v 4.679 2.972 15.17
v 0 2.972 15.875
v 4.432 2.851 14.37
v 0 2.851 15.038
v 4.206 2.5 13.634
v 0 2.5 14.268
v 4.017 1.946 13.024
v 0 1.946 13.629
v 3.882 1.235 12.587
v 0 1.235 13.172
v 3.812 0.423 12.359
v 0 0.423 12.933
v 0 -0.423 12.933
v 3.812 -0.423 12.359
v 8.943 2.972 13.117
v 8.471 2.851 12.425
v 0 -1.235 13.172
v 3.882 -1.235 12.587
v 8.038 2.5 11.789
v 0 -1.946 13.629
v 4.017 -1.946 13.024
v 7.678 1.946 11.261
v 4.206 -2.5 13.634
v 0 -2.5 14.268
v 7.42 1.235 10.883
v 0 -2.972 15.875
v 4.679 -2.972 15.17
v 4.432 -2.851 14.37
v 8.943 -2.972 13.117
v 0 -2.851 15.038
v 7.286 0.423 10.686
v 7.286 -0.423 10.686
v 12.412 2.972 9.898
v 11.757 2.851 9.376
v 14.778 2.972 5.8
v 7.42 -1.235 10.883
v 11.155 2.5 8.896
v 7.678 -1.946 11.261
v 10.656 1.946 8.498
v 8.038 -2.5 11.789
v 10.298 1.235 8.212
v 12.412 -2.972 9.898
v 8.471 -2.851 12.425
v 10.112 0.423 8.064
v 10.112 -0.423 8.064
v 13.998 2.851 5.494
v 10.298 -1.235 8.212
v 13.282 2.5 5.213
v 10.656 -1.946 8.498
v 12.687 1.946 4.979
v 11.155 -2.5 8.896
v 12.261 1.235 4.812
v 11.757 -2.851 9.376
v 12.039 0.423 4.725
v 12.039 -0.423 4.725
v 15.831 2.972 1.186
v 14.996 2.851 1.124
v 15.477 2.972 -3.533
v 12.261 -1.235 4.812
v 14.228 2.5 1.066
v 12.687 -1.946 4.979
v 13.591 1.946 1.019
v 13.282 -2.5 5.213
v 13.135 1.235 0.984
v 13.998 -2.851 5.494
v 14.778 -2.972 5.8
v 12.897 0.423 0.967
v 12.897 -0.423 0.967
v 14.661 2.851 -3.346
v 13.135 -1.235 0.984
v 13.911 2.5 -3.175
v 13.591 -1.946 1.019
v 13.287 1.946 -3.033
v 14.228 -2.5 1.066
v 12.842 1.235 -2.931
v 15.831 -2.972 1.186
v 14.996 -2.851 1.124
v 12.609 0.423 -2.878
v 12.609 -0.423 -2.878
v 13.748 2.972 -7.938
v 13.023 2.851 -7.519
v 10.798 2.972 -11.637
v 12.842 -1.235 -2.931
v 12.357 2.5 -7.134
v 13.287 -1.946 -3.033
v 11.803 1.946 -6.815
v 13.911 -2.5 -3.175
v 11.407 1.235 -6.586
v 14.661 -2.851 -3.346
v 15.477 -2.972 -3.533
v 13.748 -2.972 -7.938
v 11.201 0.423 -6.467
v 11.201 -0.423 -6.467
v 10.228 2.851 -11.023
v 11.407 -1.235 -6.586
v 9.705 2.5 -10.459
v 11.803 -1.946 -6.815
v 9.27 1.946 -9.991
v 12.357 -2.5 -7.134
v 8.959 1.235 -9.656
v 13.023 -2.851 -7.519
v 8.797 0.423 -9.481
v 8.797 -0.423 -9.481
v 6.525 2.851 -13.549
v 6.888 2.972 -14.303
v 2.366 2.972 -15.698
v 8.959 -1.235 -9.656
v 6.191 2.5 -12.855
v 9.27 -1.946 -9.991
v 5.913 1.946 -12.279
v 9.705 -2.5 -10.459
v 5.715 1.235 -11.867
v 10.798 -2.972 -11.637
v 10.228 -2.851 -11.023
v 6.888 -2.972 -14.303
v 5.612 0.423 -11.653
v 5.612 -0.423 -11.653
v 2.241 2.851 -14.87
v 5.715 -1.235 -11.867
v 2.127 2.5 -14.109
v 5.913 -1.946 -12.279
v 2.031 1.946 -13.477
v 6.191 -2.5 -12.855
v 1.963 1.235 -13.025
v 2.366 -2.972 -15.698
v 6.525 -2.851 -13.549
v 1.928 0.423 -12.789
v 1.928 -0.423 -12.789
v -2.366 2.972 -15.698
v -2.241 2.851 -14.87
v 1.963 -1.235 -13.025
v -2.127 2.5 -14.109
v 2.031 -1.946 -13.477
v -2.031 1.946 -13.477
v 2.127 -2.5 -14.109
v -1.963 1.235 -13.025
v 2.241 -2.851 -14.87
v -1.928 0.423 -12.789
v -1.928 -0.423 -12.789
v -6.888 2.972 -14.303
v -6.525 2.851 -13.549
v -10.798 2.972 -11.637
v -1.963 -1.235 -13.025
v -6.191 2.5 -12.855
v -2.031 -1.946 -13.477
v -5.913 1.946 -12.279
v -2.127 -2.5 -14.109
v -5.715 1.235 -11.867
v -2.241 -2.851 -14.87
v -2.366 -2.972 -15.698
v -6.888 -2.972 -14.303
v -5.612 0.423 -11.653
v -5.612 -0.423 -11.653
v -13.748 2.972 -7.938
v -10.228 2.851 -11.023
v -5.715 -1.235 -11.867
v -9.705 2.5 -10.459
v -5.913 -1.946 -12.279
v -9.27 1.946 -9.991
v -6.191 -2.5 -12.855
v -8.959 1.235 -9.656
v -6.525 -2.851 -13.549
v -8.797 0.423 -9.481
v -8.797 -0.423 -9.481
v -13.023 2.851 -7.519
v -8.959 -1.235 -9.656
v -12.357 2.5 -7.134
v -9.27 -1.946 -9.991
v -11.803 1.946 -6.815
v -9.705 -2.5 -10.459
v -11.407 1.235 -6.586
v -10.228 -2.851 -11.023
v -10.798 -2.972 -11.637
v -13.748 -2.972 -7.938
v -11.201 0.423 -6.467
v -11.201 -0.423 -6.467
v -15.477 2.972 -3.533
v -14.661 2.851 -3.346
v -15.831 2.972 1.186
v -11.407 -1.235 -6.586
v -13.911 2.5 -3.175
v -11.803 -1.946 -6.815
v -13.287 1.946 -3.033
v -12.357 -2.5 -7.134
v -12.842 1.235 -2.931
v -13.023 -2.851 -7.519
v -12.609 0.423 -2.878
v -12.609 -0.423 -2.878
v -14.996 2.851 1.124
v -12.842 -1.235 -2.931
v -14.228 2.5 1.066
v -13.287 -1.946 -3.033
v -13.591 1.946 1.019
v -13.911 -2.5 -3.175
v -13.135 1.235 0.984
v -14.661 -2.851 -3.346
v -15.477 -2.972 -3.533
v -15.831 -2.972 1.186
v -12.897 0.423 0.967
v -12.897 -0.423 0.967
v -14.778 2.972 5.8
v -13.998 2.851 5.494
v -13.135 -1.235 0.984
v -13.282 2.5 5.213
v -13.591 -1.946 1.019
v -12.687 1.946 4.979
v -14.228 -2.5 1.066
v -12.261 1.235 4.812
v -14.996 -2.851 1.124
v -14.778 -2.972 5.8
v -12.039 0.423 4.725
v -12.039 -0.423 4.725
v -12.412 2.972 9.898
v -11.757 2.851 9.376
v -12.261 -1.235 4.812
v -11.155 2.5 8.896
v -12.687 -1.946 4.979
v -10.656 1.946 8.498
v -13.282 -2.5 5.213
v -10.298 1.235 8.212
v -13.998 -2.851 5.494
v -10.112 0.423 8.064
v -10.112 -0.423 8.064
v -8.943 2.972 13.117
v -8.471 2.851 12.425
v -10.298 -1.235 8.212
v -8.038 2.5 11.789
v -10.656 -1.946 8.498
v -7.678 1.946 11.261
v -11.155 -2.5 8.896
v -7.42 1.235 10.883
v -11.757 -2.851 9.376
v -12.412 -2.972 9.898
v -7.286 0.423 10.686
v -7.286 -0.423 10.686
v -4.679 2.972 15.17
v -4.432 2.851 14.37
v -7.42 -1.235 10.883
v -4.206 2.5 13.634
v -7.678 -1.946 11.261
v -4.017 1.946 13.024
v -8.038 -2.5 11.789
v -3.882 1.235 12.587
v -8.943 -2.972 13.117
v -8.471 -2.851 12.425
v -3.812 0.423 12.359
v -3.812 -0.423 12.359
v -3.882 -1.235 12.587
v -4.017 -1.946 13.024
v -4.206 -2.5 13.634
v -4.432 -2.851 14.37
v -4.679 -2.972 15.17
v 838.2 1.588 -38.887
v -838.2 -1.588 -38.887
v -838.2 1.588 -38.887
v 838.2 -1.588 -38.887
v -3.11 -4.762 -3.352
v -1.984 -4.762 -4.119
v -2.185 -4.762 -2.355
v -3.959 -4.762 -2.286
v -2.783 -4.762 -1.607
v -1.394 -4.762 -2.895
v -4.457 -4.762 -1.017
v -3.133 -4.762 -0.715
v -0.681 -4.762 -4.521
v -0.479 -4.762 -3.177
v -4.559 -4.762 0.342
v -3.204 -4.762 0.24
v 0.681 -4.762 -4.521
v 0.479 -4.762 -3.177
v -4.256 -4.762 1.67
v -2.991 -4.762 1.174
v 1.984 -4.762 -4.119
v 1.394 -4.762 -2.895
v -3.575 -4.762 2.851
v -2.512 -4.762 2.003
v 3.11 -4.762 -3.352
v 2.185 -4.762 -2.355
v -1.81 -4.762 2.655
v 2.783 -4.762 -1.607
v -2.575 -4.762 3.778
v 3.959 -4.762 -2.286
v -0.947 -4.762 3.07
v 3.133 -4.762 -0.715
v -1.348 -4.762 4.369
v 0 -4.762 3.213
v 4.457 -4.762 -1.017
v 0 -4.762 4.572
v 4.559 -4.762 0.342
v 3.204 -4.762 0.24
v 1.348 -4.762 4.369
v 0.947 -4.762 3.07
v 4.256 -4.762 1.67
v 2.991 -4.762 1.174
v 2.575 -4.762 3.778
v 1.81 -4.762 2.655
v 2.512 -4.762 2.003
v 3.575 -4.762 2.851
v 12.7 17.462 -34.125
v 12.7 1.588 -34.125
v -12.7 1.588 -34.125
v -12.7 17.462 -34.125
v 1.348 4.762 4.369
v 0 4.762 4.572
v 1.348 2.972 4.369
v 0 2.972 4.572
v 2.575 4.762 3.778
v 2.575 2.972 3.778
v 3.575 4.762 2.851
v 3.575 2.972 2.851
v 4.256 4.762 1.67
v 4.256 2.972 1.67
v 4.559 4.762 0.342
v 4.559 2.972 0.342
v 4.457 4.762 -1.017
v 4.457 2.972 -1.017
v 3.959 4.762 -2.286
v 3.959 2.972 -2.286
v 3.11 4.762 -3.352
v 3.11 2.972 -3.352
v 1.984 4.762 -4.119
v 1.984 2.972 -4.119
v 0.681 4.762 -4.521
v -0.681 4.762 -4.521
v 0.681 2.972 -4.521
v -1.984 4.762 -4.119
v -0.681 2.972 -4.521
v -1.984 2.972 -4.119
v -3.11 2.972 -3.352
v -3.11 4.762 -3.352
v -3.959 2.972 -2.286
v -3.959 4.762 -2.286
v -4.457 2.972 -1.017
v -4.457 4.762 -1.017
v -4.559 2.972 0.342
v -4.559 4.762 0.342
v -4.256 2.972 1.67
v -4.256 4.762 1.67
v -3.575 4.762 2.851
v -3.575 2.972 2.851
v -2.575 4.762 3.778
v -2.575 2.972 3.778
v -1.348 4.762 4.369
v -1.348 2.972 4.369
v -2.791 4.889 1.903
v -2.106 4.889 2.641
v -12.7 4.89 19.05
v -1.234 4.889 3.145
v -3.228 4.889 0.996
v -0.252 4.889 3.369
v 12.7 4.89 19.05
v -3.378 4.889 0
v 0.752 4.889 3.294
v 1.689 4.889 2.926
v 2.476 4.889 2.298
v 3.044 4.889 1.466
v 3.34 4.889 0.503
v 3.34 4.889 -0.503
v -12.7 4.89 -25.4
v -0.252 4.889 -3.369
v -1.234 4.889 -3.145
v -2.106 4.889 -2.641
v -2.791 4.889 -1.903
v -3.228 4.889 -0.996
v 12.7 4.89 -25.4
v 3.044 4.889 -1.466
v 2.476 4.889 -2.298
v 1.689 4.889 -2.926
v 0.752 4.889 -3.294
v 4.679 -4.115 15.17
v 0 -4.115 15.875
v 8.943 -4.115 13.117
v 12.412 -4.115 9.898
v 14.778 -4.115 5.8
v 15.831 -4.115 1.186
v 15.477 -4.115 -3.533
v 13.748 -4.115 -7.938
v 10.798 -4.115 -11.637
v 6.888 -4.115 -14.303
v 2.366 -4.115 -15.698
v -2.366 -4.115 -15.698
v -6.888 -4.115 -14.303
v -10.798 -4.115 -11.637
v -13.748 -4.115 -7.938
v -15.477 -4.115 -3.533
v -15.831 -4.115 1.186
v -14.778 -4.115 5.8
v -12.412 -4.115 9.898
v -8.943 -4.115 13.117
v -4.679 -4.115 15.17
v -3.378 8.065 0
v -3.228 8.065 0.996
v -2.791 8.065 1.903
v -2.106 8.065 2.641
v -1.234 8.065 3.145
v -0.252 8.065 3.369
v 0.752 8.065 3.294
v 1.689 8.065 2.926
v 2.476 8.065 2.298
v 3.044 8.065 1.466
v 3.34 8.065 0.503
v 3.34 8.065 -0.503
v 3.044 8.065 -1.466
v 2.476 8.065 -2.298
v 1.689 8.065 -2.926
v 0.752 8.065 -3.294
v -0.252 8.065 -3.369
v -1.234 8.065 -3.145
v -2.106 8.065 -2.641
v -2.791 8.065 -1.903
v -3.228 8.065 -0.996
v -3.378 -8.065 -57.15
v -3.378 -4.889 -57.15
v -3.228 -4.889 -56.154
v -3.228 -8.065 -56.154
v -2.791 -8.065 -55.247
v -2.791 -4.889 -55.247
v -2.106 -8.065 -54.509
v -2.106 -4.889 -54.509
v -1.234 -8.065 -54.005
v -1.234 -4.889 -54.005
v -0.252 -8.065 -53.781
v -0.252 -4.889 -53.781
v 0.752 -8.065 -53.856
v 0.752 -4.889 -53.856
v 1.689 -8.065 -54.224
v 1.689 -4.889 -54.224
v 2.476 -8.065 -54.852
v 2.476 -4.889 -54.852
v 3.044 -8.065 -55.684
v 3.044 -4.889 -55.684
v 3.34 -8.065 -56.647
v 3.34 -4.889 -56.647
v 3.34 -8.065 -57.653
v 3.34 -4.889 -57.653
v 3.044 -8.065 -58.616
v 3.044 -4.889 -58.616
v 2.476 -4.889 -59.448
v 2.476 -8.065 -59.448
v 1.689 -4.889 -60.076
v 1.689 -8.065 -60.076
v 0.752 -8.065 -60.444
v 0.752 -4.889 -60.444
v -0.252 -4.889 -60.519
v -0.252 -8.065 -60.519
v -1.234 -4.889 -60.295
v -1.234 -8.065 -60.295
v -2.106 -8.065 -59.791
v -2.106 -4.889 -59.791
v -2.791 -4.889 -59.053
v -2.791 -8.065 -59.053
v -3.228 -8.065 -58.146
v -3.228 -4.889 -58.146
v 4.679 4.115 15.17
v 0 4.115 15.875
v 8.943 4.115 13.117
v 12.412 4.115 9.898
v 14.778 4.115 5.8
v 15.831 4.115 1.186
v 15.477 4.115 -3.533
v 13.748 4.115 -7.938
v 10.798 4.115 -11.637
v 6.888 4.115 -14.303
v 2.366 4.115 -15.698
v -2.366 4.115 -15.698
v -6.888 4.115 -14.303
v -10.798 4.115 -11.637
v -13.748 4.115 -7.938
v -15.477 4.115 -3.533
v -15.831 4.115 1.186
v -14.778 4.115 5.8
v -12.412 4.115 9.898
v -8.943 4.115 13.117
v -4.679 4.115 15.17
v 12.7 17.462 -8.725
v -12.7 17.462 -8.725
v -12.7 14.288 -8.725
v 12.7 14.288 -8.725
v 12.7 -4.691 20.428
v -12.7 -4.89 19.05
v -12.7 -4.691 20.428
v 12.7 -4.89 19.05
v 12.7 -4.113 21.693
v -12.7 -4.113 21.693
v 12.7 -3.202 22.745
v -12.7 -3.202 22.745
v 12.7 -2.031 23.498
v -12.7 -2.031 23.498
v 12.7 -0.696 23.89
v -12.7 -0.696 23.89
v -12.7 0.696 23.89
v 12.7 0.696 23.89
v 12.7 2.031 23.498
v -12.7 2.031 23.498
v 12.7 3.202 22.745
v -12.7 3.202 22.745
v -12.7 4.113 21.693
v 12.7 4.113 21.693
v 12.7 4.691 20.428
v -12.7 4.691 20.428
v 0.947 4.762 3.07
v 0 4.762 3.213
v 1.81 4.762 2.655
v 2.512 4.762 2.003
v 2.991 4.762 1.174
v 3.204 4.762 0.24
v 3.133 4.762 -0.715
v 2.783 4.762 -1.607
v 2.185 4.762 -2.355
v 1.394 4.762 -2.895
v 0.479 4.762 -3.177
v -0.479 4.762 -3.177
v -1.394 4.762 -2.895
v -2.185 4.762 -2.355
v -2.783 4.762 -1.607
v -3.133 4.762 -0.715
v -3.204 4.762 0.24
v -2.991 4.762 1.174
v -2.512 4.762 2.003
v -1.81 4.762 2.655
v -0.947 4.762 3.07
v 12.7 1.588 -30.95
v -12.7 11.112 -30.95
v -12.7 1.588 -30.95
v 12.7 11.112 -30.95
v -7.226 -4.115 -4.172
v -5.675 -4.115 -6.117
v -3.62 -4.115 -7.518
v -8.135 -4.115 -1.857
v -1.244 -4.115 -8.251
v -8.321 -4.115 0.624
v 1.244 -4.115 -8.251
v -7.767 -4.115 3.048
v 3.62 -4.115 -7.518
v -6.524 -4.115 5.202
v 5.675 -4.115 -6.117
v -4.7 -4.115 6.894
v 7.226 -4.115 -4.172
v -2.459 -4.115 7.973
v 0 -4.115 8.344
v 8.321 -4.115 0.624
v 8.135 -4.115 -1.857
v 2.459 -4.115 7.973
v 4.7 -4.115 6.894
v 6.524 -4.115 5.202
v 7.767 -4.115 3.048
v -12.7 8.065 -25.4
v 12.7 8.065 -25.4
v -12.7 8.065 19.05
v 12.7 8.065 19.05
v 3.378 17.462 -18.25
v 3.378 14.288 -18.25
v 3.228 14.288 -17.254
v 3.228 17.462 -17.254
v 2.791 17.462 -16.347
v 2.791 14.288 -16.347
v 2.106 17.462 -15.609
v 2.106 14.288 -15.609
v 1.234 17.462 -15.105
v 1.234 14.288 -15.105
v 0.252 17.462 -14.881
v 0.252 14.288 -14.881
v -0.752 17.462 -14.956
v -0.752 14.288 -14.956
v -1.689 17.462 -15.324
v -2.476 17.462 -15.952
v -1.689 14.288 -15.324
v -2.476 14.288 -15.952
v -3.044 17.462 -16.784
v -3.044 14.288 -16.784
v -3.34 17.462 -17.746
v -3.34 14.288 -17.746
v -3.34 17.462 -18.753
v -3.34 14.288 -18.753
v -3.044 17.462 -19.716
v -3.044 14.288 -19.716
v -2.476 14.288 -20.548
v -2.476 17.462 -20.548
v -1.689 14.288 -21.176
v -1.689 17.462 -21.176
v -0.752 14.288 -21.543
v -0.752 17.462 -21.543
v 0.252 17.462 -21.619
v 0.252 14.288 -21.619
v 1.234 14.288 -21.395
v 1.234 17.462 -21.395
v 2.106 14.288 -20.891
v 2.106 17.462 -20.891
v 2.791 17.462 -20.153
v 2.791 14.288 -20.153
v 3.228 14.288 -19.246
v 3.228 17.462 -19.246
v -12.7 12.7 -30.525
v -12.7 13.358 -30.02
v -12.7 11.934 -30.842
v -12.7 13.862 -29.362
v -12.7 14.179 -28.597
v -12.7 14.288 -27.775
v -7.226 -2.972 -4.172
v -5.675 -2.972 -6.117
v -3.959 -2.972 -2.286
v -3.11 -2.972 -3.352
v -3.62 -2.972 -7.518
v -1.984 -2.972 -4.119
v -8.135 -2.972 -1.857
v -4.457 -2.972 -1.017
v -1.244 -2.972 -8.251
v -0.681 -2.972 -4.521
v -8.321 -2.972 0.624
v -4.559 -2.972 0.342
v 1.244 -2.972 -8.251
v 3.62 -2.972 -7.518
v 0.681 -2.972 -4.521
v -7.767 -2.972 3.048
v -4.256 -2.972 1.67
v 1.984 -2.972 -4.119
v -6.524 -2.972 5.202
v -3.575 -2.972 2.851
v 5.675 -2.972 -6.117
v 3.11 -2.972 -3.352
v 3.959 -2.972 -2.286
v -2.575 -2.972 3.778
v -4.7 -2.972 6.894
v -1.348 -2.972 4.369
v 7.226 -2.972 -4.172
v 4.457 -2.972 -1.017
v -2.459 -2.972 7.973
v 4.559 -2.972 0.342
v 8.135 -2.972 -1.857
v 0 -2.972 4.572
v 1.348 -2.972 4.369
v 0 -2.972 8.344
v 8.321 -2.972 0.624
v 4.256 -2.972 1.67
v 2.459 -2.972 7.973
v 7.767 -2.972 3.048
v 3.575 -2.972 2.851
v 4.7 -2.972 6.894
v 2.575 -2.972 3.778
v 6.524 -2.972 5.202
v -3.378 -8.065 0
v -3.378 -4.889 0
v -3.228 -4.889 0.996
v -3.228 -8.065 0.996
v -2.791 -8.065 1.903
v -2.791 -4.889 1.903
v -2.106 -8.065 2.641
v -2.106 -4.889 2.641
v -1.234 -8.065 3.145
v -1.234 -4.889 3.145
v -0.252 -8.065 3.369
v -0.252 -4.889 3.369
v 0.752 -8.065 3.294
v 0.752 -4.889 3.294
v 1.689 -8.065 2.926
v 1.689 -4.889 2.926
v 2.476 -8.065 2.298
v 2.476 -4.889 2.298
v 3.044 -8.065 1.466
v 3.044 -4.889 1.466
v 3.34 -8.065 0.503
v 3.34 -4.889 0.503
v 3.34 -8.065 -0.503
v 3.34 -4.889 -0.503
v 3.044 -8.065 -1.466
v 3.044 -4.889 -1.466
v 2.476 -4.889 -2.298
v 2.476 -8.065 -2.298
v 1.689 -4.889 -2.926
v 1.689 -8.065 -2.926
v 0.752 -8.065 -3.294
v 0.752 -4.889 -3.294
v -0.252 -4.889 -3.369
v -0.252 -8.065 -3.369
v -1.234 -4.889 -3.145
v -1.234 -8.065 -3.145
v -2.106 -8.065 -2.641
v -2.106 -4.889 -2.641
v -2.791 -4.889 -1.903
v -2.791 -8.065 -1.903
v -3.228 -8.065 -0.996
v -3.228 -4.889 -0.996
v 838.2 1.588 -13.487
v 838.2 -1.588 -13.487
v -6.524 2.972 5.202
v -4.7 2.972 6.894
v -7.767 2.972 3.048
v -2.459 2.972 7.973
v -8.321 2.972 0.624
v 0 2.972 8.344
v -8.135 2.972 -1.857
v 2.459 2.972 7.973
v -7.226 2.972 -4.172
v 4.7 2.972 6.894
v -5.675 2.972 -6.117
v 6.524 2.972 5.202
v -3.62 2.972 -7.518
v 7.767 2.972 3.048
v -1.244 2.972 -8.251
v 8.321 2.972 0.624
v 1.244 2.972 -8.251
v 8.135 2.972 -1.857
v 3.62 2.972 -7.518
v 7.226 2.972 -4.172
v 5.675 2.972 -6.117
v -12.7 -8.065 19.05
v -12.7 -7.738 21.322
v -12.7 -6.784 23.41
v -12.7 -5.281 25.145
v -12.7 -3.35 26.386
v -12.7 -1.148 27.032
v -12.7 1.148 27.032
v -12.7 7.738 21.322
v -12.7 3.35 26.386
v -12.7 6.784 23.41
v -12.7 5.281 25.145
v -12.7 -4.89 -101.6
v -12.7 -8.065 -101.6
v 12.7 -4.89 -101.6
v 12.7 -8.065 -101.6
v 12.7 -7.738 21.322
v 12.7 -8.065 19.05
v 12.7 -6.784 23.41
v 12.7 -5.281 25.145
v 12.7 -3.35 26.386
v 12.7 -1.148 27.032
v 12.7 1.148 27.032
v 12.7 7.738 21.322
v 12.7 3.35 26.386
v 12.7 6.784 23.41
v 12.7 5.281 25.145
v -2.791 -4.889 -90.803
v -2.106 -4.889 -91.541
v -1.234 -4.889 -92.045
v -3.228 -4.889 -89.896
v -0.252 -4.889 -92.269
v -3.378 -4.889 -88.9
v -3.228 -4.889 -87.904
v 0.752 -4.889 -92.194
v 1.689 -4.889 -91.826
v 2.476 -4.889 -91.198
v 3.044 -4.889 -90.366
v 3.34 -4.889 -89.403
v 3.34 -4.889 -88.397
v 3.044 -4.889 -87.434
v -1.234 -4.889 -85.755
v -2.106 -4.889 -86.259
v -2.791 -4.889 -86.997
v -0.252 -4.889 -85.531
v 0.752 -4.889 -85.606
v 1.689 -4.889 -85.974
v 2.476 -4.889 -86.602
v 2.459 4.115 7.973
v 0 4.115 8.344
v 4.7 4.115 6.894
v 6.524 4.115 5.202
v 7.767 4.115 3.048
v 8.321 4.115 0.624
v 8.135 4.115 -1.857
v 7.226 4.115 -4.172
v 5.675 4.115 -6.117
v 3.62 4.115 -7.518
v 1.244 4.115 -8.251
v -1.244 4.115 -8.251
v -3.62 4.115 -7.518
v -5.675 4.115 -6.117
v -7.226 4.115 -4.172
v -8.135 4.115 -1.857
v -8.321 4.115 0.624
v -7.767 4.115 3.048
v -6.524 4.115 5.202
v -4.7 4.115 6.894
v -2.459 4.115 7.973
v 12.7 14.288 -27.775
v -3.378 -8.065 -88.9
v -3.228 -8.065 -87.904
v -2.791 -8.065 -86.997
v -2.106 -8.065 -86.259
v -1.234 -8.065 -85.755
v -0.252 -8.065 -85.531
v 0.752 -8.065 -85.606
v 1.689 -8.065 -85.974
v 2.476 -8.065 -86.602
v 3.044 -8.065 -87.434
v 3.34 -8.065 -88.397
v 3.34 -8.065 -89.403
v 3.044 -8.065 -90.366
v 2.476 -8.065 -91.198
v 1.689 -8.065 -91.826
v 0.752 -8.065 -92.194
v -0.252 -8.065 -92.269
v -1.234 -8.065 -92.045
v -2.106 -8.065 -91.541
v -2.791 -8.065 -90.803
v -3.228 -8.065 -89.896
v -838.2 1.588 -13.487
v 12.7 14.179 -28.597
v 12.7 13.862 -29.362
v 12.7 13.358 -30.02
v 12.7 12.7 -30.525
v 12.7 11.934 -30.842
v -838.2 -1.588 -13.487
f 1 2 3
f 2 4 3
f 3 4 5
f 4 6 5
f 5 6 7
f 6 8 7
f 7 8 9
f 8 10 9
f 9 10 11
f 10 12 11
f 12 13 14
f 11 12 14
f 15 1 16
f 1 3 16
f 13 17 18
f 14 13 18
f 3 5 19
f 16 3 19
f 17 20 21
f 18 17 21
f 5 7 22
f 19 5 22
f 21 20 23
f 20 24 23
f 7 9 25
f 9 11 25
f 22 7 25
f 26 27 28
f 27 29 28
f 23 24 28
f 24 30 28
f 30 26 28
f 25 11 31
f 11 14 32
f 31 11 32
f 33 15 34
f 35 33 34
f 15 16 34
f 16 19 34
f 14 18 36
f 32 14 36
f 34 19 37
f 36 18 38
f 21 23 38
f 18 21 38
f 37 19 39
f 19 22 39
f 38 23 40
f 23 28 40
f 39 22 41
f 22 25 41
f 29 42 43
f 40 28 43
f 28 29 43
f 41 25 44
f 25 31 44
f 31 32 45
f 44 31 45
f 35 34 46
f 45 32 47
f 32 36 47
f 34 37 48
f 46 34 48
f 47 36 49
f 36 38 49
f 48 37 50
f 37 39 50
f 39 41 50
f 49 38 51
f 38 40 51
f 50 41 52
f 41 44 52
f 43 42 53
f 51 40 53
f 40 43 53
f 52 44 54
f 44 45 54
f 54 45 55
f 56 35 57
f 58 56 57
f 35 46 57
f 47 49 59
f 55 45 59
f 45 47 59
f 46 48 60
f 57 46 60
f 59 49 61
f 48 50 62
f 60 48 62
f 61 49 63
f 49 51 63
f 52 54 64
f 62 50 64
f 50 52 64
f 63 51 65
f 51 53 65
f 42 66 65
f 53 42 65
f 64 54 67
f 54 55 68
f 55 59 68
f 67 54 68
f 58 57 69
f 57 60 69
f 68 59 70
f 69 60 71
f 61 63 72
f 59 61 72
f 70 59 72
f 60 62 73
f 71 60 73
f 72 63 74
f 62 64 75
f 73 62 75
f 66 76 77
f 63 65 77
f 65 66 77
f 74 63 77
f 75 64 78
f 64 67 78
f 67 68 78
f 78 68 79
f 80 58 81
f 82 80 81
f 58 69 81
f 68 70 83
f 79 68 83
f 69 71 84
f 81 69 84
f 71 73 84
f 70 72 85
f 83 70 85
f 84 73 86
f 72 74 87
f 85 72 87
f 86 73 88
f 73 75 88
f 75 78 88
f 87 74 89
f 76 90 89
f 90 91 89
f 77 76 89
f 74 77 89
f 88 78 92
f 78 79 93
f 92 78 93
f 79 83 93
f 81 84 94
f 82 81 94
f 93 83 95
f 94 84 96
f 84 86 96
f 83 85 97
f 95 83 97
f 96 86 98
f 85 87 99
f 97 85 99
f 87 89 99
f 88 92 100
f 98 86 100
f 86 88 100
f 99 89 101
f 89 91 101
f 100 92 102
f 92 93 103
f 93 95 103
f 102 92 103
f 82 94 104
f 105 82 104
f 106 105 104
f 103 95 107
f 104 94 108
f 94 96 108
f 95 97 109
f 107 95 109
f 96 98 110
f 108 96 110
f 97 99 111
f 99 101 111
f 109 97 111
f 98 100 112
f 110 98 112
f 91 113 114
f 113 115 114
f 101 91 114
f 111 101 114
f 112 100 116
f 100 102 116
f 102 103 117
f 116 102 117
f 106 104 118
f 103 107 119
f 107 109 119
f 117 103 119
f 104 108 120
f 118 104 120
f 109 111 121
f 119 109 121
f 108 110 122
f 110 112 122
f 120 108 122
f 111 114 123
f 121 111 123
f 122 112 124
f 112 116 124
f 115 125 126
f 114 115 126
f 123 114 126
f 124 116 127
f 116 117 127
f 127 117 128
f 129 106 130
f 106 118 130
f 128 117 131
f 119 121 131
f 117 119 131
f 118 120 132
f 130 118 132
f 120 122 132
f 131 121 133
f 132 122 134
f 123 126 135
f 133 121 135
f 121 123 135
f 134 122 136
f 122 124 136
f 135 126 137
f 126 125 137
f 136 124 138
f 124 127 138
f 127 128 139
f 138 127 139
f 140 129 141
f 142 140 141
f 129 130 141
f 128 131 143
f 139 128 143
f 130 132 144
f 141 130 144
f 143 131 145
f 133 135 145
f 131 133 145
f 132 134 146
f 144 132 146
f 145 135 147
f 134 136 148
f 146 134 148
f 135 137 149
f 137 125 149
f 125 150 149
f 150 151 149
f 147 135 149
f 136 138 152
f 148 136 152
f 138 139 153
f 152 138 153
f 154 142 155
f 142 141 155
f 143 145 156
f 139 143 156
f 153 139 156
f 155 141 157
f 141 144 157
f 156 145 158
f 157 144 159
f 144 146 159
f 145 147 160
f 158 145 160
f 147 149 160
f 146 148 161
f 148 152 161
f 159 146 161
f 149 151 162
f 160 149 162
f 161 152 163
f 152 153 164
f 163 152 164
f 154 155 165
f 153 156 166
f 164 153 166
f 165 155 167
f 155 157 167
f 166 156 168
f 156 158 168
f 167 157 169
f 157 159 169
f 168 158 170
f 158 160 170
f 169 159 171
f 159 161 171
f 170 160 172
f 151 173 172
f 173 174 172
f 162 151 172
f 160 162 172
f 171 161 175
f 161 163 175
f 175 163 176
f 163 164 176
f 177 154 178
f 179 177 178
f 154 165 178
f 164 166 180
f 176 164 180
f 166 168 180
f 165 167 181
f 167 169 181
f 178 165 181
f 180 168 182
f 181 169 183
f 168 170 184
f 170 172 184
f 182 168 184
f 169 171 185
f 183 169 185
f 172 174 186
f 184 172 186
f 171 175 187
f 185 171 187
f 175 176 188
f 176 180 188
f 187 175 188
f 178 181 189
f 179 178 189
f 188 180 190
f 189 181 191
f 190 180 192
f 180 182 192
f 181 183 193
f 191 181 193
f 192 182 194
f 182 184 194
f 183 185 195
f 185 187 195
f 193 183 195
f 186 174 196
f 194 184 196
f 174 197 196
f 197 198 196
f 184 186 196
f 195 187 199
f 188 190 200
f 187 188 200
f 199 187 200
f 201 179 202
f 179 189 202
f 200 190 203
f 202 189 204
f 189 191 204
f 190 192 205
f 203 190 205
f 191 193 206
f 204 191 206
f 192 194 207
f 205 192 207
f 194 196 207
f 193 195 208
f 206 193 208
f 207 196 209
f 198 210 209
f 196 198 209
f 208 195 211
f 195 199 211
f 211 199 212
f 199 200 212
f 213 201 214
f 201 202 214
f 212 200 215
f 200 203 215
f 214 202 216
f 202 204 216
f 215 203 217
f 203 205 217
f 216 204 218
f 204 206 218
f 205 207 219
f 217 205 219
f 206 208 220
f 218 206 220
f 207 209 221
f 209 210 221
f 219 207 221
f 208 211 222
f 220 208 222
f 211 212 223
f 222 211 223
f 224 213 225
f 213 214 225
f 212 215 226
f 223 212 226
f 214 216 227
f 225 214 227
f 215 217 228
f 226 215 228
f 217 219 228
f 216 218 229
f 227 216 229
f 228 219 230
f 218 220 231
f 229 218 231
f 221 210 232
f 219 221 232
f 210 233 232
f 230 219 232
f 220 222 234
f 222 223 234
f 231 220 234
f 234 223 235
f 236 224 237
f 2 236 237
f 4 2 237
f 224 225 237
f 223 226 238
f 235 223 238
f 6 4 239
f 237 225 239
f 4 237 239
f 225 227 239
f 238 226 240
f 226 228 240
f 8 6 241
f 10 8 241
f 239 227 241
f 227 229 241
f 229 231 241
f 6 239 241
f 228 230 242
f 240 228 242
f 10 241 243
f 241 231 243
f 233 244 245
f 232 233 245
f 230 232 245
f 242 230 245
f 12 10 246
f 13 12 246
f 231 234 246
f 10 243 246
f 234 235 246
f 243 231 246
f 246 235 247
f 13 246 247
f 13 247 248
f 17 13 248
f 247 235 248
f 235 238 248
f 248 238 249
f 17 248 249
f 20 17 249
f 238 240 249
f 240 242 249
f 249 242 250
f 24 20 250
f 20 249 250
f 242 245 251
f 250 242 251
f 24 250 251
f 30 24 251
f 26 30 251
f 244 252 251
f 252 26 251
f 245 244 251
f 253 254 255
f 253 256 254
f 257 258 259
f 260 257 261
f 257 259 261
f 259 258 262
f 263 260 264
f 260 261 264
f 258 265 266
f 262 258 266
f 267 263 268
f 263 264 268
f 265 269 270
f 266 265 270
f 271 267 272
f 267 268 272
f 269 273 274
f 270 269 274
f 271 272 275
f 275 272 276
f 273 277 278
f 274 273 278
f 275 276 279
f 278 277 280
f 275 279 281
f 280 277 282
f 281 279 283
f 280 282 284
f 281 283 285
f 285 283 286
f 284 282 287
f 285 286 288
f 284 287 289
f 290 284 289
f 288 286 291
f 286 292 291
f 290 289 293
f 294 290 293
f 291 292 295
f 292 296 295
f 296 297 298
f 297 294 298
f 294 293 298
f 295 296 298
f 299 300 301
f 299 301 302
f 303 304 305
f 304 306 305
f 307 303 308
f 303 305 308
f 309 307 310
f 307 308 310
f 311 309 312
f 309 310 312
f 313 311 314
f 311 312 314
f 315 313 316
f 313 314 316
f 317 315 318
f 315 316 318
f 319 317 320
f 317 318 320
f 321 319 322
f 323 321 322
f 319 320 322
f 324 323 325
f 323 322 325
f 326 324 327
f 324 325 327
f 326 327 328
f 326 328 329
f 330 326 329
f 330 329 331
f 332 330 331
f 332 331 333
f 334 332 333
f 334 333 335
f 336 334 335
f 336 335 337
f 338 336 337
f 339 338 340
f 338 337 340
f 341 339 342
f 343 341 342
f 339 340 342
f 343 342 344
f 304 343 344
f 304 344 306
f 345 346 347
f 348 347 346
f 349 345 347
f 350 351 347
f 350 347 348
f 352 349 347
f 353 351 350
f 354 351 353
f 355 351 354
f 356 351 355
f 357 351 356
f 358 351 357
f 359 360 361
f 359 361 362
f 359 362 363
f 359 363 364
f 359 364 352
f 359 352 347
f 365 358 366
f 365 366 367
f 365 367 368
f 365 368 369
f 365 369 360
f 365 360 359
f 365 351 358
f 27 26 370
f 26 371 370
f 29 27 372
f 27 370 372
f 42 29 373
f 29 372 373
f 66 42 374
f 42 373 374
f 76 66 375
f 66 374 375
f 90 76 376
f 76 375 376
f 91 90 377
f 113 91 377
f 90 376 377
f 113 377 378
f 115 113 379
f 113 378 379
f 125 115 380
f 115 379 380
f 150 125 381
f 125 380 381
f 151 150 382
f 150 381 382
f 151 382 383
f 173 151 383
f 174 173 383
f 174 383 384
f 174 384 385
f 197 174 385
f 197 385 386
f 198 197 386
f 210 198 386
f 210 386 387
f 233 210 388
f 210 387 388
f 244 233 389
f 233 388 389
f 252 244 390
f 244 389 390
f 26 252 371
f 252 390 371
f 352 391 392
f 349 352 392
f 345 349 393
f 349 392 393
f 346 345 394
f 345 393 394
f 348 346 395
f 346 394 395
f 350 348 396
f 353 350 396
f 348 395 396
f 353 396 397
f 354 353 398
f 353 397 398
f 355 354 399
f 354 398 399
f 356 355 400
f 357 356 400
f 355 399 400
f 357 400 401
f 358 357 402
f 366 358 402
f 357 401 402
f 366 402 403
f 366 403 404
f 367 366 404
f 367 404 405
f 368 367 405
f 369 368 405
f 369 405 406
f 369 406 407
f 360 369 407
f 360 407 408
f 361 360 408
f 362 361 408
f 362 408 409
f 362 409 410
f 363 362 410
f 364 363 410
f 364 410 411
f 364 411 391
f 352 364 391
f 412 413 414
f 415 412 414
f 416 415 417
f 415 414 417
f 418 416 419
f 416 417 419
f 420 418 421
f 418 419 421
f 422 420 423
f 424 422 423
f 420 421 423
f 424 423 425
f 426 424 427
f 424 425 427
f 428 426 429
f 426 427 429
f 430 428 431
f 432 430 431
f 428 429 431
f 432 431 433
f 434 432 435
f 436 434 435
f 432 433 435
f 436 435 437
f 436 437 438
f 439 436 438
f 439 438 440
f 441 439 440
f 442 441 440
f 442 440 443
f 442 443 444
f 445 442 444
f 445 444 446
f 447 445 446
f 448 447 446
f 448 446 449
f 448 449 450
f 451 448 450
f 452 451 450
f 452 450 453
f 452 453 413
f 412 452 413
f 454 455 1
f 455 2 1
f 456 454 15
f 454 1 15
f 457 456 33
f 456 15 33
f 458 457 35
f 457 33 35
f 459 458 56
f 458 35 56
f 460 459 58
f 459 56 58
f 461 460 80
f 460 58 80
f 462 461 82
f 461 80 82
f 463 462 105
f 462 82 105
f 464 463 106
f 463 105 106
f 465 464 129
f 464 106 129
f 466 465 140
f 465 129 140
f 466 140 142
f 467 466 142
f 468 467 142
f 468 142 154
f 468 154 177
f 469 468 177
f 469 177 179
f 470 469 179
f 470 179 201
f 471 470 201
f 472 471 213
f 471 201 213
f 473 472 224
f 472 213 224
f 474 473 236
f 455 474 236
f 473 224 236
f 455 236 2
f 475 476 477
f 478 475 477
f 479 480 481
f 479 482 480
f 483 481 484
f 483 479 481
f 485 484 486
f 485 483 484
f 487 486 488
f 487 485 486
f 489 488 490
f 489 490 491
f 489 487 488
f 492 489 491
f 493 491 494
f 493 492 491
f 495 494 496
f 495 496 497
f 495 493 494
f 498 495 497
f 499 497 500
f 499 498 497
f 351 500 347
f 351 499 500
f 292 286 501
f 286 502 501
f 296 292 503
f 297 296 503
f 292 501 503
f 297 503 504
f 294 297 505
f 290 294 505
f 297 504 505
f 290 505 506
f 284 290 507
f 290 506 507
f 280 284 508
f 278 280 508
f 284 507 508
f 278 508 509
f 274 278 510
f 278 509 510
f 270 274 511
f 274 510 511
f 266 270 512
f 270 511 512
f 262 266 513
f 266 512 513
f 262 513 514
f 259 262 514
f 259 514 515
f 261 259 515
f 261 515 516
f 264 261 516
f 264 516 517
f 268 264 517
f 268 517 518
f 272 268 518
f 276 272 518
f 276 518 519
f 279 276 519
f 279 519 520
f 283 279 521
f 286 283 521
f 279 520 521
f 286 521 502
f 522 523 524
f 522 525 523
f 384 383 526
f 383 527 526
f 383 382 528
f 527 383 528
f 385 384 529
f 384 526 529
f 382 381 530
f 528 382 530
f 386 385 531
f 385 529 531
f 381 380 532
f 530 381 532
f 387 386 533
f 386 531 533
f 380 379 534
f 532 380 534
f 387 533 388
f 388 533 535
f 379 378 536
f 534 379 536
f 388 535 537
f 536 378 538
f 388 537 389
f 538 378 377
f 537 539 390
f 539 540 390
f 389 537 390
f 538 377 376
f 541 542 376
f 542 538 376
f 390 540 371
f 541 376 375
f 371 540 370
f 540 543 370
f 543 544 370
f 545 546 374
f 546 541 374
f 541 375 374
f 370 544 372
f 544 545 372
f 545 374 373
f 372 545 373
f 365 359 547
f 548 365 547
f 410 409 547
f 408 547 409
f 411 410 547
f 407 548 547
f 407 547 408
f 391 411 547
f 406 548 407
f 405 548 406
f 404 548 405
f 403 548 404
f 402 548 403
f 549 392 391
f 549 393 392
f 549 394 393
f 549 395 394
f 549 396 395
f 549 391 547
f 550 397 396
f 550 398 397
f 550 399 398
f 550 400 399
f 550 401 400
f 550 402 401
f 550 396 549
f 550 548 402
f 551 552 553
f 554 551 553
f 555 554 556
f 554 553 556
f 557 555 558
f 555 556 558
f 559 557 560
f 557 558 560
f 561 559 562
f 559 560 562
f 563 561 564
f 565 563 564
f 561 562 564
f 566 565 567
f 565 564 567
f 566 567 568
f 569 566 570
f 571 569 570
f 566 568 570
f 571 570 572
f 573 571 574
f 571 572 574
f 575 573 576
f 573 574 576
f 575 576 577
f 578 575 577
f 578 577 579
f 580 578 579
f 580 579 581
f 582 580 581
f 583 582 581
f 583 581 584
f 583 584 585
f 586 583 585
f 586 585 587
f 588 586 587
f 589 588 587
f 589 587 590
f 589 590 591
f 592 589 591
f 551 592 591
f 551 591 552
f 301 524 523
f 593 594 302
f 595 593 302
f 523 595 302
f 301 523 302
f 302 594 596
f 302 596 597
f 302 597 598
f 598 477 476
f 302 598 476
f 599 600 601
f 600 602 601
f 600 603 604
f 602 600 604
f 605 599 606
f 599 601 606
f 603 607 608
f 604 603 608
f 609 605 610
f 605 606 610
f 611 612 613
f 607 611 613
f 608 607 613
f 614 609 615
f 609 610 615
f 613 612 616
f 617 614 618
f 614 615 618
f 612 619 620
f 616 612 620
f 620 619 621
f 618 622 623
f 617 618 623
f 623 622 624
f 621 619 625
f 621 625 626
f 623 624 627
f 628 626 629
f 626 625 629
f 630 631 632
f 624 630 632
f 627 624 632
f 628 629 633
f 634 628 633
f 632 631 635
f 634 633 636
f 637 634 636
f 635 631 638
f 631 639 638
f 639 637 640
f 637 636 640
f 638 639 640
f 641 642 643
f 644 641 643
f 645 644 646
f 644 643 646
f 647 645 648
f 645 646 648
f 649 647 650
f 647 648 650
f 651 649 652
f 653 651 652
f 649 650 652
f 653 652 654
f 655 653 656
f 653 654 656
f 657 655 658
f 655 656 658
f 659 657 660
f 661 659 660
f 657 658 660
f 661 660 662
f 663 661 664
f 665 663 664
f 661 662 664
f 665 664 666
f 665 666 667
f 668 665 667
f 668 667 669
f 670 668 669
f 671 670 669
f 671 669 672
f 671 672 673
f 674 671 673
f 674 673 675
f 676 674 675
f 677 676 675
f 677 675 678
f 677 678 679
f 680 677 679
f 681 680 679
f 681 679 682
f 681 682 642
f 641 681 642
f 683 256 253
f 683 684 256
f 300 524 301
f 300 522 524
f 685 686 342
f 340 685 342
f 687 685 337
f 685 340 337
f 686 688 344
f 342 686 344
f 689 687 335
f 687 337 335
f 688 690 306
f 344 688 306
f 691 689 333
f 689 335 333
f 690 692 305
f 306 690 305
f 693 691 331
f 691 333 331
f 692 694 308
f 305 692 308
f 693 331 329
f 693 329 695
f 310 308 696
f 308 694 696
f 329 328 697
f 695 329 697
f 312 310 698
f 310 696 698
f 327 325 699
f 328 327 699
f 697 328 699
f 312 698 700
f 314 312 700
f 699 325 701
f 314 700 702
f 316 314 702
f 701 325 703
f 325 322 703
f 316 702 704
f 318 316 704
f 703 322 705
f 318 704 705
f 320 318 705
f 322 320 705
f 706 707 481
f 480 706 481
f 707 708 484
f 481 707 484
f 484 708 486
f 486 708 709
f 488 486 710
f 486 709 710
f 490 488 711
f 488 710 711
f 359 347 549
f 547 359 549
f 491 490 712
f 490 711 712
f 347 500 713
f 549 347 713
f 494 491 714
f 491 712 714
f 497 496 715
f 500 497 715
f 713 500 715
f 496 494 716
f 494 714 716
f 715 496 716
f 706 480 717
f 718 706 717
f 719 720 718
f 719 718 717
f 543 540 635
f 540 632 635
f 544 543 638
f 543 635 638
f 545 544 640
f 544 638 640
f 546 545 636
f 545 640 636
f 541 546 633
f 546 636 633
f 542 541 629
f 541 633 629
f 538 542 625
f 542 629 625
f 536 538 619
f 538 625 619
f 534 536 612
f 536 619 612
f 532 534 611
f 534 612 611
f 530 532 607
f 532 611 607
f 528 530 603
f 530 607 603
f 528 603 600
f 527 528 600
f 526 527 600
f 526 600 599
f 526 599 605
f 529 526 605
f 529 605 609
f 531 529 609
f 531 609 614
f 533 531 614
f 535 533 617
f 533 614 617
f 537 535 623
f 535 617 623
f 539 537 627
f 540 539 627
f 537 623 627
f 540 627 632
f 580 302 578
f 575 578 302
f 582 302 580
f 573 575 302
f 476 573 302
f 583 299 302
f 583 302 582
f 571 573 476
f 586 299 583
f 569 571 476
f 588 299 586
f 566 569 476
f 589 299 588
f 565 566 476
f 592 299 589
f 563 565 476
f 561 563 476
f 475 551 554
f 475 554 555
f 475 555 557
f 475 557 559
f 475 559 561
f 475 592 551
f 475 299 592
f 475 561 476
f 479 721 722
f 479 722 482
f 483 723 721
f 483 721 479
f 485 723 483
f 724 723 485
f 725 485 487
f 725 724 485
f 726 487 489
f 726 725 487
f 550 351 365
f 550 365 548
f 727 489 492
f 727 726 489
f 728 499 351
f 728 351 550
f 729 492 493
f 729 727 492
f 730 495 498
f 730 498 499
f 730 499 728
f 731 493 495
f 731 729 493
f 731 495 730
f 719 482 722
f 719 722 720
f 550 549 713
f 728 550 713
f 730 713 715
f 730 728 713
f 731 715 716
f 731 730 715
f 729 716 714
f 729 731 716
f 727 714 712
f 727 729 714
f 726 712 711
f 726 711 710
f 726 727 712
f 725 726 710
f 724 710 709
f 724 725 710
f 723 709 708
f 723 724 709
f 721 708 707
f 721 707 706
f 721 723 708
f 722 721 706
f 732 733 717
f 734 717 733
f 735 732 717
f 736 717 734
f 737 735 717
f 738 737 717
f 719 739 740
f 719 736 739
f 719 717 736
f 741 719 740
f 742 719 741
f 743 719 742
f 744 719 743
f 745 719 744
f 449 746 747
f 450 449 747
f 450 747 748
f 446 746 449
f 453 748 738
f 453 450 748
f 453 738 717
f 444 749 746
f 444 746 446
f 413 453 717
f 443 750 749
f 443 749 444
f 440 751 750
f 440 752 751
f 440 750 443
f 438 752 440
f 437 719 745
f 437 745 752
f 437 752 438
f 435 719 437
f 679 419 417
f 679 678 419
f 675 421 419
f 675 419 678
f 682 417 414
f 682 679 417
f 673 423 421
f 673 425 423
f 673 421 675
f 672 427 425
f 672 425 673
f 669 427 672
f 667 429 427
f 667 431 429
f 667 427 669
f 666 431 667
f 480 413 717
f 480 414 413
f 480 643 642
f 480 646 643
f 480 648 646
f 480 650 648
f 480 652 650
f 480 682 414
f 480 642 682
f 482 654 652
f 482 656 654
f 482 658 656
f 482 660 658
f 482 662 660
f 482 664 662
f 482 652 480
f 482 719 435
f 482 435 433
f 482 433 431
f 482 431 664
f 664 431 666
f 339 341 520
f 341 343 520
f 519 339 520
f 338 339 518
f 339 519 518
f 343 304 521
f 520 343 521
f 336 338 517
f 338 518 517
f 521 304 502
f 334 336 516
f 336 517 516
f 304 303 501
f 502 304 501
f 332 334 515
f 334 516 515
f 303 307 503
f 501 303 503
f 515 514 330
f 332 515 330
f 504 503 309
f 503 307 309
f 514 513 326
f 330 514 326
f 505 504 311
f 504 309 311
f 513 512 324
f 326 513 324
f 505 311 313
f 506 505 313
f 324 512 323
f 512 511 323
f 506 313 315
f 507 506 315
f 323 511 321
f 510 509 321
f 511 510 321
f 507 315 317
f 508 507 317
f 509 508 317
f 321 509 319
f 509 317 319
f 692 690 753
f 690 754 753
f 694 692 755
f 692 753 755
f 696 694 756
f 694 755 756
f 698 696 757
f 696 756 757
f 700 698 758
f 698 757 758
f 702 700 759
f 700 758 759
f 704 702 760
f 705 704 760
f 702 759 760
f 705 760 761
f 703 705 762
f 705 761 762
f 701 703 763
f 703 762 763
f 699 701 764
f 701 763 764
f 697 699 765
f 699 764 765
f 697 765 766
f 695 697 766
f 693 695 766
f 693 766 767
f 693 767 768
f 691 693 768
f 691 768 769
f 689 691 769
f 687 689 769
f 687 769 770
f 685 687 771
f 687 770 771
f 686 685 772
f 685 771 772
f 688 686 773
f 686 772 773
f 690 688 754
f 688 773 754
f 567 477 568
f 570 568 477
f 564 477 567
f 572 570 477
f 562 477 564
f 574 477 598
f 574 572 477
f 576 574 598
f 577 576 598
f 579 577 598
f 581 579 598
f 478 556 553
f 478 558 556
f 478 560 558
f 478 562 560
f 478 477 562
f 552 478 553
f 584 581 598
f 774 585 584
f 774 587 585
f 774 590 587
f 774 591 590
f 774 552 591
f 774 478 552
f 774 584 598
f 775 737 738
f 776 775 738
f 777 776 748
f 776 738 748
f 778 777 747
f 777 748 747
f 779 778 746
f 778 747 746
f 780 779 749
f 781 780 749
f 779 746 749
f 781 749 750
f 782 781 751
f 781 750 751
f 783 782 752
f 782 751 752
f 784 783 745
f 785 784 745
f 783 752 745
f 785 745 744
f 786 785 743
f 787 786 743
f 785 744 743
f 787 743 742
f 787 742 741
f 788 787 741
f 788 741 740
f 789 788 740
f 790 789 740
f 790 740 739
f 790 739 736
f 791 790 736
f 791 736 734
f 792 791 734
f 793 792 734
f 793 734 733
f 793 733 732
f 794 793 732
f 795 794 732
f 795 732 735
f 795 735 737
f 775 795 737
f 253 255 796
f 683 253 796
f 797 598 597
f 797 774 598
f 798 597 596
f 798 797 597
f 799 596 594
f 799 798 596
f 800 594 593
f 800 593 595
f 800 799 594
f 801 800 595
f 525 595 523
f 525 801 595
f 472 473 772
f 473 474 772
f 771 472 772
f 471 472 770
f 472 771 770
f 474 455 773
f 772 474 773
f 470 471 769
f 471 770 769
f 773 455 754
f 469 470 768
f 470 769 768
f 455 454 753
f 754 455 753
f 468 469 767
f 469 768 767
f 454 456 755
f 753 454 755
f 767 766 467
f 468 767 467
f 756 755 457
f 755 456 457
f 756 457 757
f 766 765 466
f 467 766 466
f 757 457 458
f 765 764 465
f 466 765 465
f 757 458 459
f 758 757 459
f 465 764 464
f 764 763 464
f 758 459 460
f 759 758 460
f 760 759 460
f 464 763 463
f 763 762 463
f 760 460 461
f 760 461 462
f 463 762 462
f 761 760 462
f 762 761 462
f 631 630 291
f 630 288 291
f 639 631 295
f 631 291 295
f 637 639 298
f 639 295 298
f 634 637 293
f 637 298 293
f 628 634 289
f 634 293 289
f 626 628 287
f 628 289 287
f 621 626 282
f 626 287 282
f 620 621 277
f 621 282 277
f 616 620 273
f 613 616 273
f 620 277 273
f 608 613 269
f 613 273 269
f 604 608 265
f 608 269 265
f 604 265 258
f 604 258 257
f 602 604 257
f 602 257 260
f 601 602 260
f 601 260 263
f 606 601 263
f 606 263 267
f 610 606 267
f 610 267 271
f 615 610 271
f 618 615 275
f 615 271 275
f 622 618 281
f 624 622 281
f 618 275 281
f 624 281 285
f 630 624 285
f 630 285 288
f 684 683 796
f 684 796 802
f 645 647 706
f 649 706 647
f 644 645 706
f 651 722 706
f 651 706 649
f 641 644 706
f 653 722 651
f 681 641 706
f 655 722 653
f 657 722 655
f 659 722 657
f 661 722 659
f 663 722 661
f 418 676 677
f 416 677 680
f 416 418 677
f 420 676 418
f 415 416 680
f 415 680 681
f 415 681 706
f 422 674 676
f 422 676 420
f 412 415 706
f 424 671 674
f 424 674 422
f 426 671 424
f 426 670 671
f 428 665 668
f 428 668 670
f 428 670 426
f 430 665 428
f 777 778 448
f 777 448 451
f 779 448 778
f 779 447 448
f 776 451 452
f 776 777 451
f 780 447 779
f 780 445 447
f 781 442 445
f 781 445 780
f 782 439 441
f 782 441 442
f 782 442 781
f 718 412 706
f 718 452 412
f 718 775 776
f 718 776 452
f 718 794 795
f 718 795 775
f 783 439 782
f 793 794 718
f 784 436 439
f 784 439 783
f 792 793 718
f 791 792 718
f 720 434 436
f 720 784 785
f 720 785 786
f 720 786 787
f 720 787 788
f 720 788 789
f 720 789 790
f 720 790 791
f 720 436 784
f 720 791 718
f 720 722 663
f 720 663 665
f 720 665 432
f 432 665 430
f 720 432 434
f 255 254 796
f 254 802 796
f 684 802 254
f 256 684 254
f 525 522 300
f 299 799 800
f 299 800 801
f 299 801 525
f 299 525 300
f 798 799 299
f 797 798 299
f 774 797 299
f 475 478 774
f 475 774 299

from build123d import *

# Parameters (mm, degrees)
F3_DEPTH = 838.2
F4_DEPTH = 12.7
F5_DEPTH = 12.7
F7_D     = 6.7564
F9_D     = 6.7564


with BuildPart() as f1:
    # F0 (on Right) → F1 (revolve)
    with BuildSketch(Plane.YZ):
        with BuildLine():
            Line((-4.7625, 4.572), (-4.7625, 3.2131))
            Line((-4.7625, 3.2131), (4.7625, 3.2131))
            Line((4.7625, 3.2131), (4.7625, 4.572))
            Line((4.7625, 4.572), (2.9718, 4.572))
            Line((2.9718, 4.572), (2.9718, 8.3439))
            Line((2.9718, 8.3439), (4.1148, 8.3439))
            Line((4.1148, 8.3439), (4.1148, 15.875))
            Line((4.1148, 15.875), (2.9718, 15.875))
            ThreePointArc((2.9718, 15.875), (0, 12.9032), (-2.9718, 15.875))
            Line((-2.9718, 15.875), (-4.1148, 15.875))
            Line((-4.1148, 15.875), (-4.1148, 8.3439))
            Line((-4.1148, 8.3439), (-2.9718, 8.3439))
            Line((-2.9718, 8.3439), (-2.9718, 4.572))
            Line((-2.9718, 4.572), (-4.7625, 4.572))
        make_face()
    revolve(axis=Axis((0, 0.9060123301, 0), (0, 1, 0)))


with BuildPart() as f3:
    # F2 (on Right) → F3 (new body, symmetric)
    with BuildSketch(Plane.YZ):
        Polygon((-1.5875, -38.8874), (1.5875, -38.8874), (1.5875, -34.1249), (1.5875, -30.9499), (1.5875, -13.4874), (-1.5875, -13.4874), align=None)
    extrude(amount=F3_DEPTH, both=True)


with BuildPart() as f4:
    # F2 (on Right) → F4 (new body, symmetric)
    with BuildSketch(Plane.YZ):
        with BuildLine():
            Line((4.8895, 19.05), (4.8895, -25.4))
            Line((4.8895, -25.4), (8.0645, -25.4))
            Line((8.0645, -25.4), (8.0645, 19.05))
            ThreePointArc((8.0645, 19.05), (0, 27.1145), (-8.0645, 19.05))
            Line((-8.0645, 19.05), (-8.0645, -101.6))
            Line((-8.0645, -101.6), (-4.8895, -101.6))
            Line((-4.8895, -101.6), (-4.8895, 19.05))
            ThreePointArc((-4.8895, 19.05), (0, 23.9395), (4.8895, 19.05))
        make_face()
    extrude(amount=F4_DEPTH, both=True)

    # F7 (through all)
    with Locations(Plane.XZ.offset(8.0645)):
        with Locations((0, 0), (0, -57.15), (0, -88.9)):
            Hole(F7_D / 2)


with BuildPart() as f5:
    # F2 (on Right) → F5 (new body, symmetric)
    with BuildSketch(Plane.YZ):
        with BuildLine():
            Line((1.5875, -30.9499), (1.5875, -34.1249))
            Line((1.5875, -34.1249), (17.4625, -34.1249))
            Line((17.4625, -34.1249), (17.4625, -8.7249))
            Line((17.4625, -8.7249), (14.2875, -8.7249))
            Line((14.2875, -8.7249), (14.2875, -27.7749))
            ThreePointArc((14.2875, -27.7749), (13.3575640303, -30.0199640303), (11.1125, -30.9499))
            Line((11.1125, -30.9499), (1.5875, -30.9499))
        make_face()
    extrude(amount=F5_DEPTH, both=True)

    # F9 (through all)
    with Locations(Plane(origin=(0, 17.4625, 0), x_dir=(-1, 0, 0), z_dir=(0, 1, 0))):
        with Locations((0, -18.2499)):
            Hole(F9_D / 2)


solid = Compound([f1.part, f3.part, f4.part, f5.part])
